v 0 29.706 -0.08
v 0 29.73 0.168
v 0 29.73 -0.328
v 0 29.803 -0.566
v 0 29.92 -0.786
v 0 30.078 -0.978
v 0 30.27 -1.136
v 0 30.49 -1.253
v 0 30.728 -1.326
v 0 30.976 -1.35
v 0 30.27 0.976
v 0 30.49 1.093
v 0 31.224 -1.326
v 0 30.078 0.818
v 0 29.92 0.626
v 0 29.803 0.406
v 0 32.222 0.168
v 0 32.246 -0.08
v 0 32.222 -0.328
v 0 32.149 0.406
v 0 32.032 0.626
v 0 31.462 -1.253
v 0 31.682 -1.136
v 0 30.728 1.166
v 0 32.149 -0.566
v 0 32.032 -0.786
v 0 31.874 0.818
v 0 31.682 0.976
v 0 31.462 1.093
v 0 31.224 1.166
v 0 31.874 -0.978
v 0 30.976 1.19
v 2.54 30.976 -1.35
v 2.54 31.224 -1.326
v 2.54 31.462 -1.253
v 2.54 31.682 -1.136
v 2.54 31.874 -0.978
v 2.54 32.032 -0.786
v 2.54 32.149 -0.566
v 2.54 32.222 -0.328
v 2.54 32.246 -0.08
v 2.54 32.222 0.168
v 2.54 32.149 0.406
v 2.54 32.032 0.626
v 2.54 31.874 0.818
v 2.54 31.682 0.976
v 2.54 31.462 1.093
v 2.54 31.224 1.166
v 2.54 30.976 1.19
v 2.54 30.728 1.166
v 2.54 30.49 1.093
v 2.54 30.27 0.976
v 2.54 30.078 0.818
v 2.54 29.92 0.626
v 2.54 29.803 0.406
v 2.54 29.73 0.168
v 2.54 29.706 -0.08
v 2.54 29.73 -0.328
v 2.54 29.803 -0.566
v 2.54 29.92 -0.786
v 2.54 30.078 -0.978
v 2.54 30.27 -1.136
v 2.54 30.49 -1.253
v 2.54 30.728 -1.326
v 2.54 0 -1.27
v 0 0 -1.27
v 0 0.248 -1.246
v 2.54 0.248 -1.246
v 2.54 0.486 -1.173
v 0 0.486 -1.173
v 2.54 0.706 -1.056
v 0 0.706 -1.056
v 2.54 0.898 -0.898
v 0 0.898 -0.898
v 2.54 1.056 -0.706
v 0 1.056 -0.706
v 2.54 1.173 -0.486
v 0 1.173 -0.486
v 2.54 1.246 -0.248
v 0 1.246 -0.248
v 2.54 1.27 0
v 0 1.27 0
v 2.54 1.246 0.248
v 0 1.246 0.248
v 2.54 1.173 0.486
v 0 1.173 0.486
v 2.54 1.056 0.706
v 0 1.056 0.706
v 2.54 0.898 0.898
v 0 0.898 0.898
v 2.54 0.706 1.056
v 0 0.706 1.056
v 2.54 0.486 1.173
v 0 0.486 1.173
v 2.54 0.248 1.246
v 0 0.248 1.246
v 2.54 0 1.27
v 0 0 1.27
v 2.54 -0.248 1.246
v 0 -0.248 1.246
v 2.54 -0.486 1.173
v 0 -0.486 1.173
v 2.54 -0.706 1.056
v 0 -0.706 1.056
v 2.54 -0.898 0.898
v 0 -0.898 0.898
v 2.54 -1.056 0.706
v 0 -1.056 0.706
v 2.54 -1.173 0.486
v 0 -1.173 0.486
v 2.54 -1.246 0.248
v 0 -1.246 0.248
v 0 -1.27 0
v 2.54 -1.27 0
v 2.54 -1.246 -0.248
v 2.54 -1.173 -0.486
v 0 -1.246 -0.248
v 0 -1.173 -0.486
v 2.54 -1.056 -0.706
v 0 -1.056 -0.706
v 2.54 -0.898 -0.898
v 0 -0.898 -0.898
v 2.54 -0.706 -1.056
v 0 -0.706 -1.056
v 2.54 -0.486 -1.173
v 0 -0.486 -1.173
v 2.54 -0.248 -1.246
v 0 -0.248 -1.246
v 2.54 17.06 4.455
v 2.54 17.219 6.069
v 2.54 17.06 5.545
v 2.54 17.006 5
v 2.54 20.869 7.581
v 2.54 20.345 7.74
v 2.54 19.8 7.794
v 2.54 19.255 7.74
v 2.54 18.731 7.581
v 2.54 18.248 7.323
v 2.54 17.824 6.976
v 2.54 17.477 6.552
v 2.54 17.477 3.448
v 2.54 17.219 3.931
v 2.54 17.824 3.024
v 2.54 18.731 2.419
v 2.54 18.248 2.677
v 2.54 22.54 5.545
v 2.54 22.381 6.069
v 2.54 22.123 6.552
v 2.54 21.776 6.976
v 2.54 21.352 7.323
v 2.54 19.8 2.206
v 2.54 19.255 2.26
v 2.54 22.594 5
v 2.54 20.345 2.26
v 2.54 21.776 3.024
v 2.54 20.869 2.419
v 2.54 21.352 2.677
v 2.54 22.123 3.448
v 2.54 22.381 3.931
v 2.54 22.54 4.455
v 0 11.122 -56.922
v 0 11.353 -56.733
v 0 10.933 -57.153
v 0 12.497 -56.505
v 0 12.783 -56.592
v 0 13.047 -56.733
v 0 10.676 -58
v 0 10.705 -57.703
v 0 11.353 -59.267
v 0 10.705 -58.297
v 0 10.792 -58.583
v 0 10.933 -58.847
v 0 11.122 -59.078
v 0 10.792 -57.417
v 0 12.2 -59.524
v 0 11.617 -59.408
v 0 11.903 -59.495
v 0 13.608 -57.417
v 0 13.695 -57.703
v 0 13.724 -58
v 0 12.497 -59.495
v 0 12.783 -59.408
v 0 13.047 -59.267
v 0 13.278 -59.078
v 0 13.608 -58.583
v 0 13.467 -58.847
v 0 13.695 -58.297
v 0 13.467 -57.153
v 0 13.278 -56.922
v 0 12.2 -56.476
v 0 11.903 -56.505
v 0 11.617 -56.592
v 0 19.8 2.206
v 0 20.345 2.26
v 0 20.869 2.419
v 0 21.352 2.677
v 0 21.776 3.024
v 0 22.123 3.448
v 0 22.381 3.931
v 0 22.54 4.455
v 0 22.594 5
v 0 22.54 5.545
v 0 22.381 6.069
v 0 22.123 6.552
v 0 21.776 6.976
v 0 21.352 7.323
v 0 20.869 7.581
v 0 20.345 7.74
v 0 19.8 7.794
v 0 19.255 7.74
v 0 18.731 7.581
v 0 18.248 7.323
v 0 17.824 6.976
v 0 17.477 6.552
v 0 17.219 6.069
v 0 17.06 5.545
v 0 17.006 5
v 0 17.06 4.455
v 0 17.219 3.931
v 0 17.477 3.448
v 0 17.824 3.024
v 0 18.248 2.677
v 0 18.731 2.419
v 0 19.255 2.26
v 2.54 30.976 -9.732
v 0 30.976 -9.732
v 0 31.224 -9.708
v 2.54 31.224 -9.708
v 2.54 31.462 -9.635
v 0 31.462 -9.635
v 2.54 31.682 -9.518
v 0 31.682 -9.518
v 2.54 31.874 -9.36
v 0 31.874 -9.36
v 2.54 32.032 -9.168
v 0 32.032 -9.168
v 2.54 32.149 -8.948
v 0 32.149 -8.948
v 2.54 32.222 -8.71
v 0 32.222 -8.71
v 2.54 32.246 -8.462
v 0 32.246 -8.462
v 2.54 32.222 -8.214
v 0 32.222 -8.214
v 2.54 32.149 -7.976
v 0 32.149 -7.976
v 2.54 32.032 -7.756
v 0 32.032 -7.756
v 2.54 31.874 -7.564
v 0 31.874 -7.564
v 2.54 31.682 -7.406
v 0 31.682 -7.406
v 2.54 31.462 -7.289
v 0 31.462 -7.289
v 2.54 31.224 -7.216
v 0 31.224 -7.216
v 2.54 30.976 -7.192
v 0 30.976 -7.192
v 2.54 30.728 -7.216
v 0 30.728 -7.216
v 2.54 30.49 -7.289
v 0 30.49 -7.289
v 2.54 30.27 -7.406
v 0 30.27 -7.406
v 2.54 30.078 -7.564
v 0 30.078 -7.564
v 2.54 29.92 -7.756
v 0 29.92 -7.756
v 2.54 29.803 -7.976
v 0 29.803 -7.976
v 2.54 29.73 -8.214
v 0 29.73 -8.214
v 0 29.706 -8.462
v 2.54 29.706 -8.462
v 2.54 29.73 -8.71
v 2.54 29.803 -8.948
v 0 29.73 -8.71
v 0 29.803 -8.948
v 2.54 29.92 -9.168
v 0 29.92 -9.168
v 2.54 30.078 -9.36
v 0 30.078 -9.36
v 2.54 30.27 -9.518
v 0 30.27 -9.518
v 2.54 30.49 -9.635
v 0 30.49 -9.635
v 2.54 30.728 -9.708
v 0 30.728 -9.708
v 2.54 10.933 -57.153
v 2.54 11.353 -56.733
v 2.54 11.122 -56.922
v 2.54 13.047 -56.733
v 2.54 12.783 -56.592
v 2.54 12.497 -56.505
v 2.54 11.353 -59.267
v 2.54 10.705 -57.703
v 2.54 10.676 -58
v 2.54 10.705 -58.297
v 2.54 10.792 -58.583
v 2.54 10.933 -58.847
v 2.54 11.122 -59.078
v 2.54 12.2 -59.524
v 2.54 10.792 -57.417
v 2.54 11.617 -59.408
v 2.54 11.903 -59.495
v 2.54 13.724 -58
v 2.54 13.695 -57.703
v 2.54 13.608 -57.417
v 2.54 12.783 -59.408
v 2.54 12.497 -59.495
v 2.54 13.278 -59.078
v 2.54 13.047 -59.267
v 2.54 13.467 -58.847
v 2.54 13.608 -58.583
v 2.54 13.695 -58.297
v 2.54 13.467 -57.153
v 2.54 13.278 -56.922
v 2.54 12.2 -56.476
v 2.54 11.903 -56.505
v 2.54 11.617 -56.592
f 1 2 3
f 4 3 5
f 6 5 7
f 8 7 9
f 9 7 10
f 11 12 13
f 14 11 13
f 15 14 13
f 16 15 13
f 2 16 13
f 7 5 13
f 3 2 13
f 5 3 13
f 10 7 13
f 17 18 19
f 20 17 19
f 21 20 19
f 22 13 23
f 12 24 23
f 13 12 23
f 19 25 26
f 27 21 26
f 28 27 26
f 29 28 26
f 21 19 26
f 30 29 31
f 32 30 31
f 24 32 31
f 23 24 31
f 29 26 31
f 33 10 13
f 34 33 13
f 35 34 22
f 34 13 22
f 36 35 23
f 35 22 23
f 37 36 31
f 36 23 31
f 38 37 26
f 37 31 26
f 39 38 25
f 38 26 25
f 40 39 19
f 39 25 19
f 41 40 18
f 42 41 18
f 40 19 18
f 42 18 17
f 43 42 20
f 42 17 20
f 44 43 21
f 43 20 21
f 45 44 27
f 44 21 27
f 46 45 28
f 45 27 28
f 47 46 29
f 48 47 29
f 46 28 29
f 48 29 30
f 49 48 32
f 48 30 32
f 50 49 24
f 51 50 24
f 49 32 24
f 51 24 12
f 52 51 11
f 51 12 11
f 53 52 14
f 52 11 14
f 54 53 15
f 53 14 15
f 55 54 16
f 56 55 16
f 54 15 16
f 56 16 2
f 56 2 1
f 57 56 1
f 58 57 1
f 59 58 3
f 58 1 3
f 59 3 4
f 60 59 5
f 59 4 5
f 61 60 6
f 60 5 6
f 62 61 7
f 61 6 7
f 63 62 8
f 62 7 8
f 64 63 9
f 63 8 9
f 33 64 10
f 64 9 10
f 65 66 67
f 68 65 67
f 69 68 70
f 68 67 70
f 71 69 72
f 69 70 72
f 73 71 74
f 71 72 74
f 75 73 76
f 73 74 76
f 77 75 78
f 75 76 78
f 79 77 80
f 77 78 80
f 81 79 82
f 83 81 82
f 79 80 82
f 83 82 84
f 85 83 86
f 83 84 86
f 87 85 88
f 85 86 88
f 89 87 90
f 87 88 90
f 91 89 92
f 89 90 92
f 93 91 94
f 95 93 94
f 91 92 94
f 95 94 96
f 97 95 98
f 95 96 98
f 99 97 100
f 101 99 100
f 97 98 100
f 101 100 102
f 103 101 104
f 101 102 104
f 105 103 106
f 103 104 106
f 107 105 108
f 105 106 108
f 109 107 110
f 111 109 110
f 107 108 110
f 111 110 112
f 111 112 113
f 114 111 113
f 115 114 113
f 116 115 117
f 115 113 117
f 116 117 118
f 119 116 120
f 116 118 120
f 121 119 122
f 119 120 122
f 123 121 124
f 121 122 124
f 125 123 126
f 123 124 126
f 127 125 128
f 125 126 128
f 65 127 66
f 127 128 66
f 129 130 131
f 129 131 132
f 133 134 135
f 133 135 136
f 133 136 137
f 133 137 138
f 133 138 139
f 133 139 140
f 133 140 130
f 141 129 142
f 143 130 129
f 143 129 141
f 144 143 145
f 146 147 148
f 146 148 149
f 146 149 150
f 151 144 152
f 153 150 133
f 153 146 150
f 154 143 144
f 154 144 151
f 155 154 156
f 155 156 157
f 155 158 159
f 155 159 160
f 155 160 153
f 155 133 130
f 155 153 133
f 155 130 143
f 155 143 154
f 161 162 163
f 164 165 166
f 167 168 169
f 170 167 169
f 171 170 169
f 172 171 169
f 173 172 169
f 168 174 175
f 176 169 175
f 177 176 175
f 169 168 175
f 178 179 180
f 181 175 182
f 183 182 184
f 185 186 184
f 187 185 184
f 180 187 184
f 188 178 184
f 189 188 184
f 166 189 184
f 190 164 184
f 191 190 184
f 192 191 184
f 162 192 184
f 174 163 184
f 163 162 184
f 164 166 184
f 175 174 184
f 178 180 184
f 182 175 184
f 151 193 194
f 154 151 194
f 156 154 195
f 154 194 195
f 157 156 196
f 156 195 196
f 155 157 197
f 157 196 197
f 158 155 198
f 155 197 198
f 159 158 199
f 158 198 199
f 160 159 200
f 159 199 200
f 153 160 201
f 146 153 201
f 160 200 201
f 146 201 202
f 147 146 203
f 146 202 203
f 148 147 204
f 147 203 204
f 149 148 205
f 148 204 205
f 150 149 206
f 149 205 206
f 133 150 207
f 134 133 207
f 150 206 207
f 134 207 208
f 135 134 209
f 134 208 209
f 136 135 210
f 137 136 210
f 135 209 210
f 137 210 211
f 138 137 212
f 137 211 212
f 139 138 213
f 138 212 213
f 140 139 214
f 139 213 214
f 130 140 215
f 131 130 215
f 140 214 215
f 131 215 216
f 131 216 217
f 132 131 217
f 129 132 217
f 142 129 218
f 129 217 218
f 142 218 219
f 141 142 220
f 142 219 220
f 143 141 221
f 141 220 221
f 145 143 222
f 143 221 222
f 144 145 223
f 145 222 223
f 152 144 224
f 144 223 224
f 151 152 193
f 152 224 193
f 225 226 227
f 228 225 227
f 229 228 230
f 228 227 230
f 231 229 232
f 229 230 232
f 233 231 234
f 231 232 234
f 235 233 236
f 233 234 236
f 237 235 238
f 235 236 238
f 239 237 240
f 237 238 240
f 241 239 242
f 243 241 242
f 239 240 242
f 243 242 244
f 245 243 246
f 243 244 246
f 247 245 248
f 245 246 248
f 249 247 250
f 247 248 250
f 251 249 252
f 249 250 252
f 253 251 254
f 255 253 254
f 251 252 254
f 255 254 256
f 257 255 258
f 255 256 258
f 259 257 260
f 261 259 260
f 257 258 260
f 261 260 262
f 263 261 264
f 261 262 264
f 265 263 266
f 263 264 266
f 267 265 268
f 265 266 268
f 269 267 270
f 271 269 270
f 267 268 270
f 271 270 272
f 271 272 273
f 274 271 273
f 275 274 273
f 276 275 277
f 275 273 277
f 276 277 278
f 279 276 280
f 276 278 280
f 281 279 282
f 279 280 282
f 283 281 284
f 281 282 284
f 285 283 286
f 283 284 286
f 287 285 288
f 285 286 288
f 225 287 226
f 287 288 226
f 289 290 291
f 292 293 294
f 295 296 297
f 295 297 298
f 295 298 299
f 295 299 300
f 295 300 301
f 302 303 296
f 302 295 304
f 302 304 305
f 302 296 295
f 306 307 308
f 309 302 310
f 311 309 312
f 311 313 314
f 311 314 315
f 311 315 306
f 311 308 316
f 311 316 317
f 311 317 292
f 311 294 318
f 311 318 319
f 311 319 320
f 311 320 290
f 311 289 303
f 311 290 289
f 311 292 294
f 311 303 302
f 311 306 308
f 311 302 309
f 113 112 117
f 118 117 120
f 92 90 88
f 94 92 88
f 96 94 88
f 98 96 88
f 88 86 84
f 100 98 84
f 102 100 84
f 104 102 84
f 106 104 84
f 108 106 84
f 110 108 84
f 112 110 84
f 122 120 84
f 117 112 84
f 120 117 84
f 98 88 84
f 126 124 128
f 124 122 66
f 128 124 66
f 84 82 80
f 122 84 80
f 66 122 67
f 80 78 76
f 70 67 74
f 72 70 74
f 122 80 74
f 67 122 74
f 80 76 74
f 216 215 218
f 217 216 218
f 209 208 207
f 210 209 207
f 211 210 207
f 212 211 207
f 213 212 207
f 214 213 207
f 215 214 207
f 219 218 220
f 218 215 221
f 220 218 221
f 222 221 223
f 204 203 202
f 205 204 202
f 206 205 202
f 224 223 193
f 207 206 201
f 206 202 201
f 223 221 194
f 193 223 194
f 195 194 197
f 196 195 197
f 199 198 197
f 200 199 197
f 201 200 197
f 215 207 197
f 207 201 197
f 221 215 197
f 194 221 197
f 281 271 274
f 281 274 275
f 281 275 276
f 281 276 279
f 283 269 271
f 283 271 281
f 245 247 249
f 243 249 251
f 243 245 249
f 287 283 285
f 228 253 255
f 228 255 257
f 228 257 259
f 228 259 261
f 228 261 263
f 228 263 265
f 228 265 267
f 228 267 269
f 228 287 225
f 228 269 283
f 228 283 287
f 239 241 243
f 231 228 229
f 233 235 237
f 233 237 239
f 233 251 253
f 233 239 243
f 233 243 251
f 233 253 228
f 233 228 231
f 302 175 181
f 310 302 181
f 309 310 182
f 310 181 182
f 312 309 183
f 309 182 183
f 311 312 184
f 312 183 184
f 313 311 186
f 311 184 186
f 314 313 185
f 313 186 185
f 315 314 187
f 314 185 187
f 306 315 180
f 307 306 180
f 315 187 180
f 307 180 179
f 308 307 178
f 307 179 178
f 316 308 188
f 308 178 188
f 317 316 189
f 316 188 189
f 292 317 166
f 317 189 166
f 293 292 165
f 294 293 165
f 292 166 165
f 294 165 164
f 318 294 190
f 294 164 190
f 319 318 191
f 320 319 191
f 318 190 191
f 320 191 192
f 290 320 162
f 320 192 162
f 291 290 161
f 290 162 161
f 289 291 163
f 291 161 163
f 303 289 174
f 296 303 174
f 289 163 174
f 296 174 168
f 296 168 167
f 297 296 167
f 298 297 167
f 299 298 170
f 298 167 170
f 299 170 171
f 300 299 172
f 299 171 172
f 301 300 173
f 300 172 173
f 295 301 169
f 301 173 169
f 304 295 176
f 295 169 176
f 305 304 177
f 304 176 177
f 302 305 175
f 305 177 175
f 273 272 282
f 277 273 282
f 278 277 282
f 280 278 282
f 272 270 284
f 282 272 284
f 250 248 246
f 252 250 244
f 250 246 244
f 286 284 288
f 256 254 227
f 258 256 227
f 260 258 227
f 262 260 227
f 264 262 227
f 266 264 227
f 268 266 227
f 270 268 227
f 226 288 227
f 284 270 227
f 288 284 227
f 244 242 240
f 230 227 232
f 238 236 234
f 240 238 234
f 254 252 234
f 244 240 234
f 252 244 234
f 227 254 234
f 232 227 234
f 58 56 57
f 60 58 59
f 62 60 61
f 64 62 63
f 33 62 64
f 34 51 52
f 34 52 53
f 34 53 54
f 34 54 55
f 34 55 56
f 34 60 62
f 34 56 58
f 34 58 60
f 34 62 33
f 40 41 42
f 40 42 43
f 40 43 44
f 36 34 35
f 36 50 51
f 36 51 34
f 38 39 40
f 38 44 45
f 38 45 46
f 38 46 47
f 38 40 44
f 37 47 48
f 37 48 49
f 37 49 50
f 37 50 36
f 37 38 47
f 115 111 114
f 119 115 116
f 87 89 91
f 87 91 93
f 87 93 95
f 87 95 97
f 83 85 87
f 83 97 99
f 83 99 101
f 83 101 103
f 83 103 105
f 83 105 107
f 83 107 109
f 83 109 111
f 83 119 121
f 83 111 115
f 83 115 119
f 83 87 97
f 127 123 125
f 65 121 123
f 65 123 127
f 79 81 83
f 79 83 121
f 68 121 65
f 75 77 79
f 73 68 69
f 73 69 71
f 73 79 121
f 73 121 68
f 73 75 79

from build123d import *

# Parameters (mm, degrees)
SKETCH1_R             = 1.27
BOSS_EXTRUDE1_DEPTH   = 2.54
SKETCH1_R_2           = 2.794
BOSS_EXTRUDE1_2_DEPTH = 2.54
SKETCH1_R_3           = 1.524
BOSS_EXTRUDE1_3_DEPTH = 2.54
BOSS_EXTRUDE1_4_DEPTH = 2.54
BOSS_EXTRUDE1_5_DEPTH = 2.54


with BuildPart() as part:
    # Sketch1 → Boss-Extrude1 (new body)
    with BuildSketch(Plane(origin=(0, 0, 0), x_dir=(0, 0, -1), z_dir=(1, 0, 0))):
        Circle(SKETCH1_R)
    extrude(amount=BOSS_EXTRUDE1_DEPTH)


with BuildPart() as body_2:
    # Sketch1 → Boss-Extrude1 2 (new body)
    with BuildSketch(Plane(origin=(0, 0, 0), x_dir=(0, 0, -1), z_dir=(1, 0, 0))):
        with Locations((-5, 19.8)):
            Circle(SKETCH1_R_2)
    extrude(amount=BOSS_EXTRUDE1_2_DEPTH)


with BuildPart() as body_3:
    # Sketch1 → Boss-Extrude1 3 (new body)
    with BuildSketch(Plane(origin=(0, 0, 0), x_dir=(0, 0, -1), z_dir=(1, 0, 0))):
        with Locations((58, 12.2)):
            Circle(SKETCH1_R_3)
    extrude(amount=BOSS_EXTRUDE1_3_DEPTH)


with BuildPart() as body_4:
    # Sketch1 → Boss-Extrude1 4 (new body)
    with BuildSketch(Plane(origin=(0, 0, 0), x_dir=(0, 0, -1), z_dir=(1, 0, 0))):
        with Locations((0.08, 30.976)):
            Circle(SKETCH1_R)
    extrude(amount=BOSS_EXTRUDE1_4_DEPTH)


with BuildPart() as body_5:
    # Sketch1 → Boss-Extrude1 5 (new body)
    with BuildSketch(Plane(origin=(0, 0, 0), x_dir=(0, 0, -1), z_dir=(1, 0, 0))):
        with Locations((8.462, 30.976)):
            Circle(SKETCH1_R)
    extrude(amount=BOSS_EXTRUDE1_5_DEPTH)


solid = Compound([part.part, body_2.part, body_3.part, body_4.part, body_5.part])
